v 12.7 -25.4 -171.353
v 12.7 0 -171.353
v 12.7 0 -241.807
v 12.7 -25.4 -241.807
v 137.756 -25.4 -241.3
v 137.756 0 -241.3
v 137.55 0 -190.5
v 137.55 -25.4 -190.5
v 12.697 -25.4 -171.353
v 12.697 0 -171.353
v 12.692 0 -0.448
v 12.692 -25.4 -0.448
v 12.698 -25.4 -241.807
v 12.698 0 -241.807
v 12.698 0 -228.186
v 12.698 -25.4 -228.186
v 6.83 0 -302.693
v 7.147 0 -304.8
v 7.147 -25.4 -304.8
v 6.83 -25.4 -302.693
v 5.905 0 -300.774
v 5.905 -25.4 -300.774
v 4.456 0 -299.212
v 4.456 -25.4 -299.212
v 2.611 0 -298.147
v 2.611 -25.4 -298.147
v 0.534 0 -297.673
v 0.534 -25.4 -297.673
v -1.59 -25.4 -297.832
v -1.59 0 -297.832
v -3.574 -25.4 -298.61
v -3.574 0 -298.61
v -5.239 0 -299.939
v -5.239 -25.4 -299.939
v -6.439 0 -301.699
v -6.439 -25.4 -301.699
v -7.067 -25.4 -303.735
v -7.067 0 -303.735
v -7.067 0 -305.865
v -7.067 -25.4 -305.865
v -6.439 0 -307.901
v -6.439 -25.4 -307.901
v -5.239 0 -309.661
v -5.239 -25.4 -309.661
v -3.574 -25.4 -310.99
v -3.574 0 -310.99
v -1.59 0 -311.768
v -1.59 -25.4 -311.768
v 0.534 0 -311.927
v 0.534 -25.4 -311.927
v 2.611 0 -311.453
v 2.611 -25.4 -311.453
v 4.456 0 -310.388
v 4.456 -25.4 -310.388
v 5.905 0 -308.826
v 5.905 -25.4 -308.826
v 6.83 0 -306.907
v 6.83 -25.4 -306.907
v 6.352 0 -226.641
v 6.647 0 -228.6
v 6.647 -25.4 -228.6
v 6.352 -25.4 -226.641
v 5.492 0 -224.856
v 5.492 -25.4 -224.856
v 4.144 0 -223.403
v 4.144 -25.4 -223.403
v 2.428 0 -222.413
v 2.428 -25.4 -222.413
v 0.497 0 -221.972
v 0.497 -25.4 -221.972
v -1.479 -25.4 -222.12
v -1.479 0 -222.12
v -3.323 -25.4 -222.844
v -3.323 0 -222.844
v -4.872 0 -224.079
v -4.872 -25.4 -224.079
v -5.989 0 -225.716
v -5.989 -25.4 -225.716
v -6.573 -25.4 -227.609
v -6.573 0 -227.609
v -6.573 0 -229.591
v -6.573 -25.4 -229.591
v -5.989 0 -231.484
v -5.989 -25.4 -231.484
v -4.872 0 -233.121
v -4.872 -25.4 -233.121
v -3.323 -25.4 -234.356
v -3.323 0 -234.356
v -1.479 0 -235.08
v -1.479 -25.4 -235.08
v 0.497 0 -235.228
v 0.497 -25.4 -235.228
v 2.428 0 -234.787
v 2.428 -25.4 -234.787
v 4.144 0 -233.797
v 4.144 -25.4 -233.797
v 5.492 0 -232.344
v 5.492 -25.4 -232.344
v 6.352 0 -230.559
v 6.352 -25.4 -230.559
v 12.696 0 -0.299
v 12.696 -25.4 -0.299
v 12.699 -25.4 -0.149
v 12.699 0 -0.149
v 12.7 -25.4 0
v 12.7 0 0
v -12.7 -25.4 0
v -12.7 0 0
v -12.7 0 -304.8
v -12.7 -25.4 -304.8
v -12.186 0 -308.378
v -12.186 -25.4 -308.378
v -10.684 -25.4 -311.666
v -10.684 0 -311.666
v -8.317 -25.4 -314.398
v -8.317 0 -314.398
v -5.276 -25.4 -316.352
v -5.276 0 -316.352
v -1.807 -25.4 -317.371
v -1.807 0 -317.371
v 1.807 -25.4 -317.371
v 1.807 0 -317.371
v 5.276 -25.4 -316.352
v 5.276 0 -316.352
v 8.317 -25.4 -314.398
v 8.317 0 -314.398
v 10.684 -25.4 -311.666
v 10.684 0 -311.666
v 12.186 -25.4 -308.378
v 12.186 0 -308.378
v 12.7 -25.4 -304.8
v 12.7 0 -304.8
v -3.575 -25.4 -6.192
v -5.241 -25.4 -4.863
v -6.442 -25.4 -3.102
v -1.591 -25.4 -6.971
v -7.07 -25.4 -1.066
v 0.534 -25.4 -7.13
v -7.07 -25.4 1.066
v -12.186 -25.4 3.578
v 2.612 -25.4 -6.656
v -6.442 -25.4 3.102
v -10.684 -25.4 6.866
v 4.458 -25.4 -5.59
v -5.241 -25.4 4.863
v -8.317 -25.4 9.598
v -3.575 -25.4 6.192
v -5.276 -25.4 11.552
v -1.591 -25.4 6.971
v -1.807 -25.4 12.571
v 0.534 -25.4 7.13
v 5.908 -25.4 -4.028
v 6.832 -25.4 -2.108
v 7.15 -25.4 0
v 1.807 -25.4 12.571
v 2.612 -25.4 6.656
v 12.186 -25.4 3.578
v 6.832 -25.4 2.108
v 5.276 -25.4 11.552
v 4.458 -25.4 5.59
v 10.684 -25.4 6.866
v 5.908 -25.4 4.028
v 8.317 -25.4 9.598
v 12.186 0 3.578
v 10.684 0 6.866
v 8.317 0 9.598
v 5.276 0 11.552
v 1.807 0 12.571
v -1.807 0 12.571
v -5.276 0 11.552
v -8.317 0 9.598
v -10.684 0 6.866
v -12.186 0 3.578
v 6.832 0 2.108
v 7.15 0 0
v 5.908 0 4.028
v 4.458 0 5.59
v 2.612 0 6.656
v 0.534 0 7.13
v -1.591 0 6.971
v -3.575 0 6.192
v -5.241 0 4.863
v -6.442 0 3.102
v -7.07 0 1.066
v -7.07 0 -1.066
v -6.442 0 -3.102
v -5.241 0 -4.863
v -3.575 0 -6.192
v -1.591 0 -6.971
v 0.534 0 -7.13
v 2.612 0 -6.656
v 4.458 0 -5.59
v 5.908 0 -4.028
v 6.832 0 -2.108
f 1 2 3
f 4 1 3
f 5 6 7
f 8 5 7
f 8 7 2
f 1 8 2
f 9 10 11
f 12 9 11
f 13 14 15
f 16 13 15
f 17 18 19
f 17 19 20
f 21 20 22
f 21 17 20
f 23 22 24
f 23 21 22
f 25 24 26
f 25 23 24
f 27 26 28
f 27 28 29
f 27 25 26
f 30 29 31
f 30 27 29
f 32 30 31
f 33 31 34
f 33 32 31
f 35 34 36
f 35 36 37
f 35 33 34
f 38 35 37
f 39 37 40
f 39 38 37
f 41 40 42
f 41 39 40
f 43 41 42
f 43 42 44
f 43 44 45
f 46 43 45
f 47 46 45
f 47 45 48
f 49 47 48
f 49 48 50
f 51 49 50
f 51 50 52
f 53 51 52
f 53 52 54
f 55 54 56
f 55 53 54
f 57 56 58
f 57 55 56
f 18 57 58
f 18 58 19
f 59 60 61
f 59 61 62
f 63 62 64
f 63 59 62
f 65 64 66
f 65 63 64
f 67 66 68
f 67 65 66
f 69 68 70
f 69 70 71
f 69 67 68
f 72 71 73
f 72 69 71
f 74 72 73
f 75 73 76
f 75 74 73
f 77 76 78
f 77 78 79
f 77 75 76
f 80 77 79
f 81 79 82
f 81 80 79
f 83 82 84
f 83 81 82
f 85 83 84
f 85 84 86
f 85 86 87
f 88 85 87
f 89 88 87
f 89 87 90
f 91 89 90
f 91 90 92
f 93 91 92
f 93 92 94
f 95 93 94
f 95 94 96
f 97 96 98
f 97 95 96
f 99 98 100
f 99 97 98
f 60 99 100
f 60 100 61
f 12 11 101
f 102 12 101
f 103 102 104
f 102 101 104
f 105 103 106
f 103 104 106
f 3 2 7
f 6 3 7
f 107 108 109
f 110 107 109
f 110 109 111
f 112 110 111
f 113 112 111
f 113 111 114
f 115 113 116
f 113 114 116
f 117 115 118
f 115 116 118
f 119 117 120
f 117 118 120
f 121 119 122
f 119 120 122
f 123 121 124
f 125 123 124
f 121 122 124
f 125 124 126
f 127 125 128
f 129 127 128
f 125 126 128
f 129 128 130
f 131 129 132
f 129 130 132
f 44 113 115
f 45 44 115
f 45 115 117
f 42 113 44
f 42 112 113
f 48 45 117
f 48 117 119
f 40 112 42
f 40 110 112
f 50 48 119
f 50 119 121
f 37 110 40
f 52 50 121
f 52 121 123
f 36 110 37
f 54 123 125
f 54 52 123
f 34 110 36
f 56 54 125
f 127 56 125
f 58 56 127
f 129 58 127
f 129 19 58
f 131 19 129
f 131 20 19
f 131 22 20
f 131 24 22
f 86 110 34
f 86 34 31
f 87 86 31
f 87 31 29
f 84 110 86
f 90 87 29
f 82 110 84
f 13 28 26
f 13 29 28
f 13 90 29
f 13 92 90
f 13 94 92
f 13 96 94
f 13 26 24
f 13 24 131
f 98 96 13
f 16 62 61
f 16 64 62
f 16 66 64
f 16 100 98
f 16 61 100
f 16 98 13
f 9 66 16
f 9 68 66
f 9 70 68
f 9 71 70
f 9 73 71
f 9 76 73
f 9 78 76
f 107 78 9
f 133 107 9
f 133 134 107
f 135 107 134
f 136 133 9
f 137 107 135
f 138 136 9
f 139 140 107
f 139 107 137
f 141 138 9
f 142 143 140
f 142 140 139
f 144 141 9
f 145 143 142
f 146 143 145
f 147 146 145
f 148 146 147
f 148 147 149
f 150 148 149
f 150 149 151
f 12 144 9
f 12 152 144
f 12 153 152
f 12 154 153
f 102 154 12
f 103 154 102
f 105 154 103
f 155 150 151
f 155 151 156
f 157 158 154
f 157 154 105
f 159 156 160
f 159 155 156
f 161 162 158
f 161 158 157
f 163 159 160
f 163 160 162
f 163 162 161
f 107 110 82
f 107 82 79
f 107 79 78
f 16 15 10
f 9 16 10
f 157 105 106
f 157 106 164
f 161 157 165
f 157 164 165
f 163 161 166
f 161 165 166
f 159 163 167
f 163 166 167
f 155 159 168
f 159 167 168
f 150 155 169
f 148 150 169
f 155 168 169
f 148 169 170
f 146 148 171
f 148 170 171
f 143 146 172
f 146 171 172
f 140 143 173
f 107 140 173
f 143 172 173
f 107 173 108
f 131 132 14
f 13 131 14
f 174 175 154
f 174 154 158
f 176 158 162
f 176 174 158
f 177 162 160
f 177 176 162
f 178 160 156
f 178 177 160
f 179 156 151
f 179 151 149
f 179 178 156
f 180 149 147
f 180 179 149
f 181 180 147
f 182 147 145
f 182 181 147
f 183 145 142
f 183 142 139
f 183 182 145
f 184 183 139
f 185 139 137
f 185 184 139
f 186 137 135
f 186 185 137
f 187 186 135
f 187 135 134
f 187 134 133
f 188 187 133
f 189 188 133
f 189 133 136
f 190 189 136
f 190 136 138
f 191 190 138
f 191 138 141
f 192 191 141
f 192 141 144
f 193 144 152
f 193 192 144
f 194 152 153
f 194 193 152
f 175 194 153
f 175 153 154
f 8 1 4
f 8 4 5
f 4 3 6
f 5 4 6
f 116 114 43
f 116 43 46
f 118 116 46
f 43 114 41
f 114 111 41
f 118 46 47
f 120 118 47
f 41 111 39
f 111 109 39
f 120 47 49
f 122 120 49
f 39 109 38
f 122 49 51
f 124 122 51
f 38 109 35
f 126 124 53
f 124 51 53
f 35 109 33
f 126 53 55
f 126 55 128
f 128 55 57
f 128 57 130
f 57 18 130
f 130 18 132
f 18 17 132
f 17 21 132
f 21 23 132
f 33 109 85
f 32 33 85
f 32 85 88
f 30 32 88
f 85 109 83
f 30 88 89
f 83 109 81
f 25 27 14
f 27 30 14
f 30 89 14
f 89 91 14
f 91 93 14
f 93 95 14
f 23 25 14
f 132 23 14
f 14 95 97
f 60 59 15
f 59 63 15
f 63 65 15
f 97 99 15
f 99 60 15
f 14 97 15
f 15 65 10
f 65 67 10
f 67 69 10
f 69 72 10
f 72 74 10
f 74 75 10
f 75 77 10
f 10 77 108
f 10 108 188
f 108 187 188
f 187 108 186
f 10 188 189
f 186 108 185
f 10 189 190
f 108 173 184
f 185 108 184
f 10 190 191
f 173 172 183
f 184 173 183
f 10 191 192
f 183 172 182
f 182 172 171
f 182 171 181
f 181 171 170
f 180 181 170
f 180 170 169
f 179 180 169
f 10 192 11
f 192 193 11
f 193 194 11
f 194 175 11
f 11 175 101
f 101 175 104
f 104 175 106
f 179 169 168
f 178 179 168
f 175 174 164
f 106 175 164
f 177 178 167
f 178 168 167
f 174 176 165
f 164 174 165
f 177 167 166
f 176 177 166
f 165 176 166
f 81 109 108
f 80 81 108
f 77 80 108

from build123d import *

# Parameters (mm, degrees)
F0_R     = 7.1501
F0_R_2   = 6.646798642
F0_R_3   = 7.1470953858
F1_DEPTH = 25.4


# Not quite as in the source:
# - a feature names something its author has since deleted; it is built from what else it names


with BuildPart() as f1:
    # F0 (on Front) → F1 (new body)
    with BuildSketch(Plane.XZ):
        with BuildLine():
            ThreePointArc((12.692106418, -0.4476993117), (12.6980264512, -0.223884447), (12.7, 0))
            ThreePointArc((12.7, 0), (0, 12.7), (-12.7, 0))
            ThreePointArc((-12.7, 0), (-0.223884447, -12.6980264512), (12.692106418, -0.4476993117))
        make_face()
        Circle(F0_R, mode=Mode.SUBTRACT)
        with BuildLine():
            ThreePointArc((12.692106418, -0.4476993117), (-0.223884447, -12.6980264512), (-12.7, 0))
            Line((-12.7, 0), (-12.7, -304.8))
            ThreePointArc((-12.7, -304.8), (-0.0001646916, -292.1000000011), (12.6999999957, -304.7996706168))
            Line((12.6999999957, -304.7996706168), (12.6983662356, -241.8069263698))
            Line((12.6983662356, -241.8069263698), (12.6980129786, -241.8069278017))
            Line((12.6980129786, -241.8069278017), (12.6980129786, -228.1864268658))
            Line((12.6980129786, -228.1864268658), (12.6965389522, -171.3525252163))
            Line((12.6965389522, -171.3525252163), (12.692106418, -0.4476993117))
        make_face()
        with Locations((0, -228.6)):
            Circle(F0_R_2, mode=Mode.SUBTRACT)
        with BuildLine():
            ThreePointArc((12.6999999957, -304.7996706168), (-0.0001646916, -292.1000000011), (-12.7, -304.8))
            ThreePointArc((-12.7, -304.8), (0, -317.5), (12.7, -304.8))
            ThreePointArc((12.7, -304.8), (12.6999999989, -304.7998353084), (12.6999999957, -304.7996706168))
        make_face()
        with Locations((0, -304.8)):
            Circle(F0_R_3, mode=Mode.SUBTRACT)
    extrude(amount=F1_DEPTH)


with BuildPart() as f1b:
    # F0 (on Front) → F1, piece 2 (new body)
    with BuildSketch(Plane.XZ):
        Polygon((137.5501584362, -190.5), (12.7, -171.3530560005), (12.7, -241.8069197473), (137.7560782405, -241.3), align=None)
    extrude(amount=F1_DEPTH)


solid = Compound([f1.part, f1b.part])
